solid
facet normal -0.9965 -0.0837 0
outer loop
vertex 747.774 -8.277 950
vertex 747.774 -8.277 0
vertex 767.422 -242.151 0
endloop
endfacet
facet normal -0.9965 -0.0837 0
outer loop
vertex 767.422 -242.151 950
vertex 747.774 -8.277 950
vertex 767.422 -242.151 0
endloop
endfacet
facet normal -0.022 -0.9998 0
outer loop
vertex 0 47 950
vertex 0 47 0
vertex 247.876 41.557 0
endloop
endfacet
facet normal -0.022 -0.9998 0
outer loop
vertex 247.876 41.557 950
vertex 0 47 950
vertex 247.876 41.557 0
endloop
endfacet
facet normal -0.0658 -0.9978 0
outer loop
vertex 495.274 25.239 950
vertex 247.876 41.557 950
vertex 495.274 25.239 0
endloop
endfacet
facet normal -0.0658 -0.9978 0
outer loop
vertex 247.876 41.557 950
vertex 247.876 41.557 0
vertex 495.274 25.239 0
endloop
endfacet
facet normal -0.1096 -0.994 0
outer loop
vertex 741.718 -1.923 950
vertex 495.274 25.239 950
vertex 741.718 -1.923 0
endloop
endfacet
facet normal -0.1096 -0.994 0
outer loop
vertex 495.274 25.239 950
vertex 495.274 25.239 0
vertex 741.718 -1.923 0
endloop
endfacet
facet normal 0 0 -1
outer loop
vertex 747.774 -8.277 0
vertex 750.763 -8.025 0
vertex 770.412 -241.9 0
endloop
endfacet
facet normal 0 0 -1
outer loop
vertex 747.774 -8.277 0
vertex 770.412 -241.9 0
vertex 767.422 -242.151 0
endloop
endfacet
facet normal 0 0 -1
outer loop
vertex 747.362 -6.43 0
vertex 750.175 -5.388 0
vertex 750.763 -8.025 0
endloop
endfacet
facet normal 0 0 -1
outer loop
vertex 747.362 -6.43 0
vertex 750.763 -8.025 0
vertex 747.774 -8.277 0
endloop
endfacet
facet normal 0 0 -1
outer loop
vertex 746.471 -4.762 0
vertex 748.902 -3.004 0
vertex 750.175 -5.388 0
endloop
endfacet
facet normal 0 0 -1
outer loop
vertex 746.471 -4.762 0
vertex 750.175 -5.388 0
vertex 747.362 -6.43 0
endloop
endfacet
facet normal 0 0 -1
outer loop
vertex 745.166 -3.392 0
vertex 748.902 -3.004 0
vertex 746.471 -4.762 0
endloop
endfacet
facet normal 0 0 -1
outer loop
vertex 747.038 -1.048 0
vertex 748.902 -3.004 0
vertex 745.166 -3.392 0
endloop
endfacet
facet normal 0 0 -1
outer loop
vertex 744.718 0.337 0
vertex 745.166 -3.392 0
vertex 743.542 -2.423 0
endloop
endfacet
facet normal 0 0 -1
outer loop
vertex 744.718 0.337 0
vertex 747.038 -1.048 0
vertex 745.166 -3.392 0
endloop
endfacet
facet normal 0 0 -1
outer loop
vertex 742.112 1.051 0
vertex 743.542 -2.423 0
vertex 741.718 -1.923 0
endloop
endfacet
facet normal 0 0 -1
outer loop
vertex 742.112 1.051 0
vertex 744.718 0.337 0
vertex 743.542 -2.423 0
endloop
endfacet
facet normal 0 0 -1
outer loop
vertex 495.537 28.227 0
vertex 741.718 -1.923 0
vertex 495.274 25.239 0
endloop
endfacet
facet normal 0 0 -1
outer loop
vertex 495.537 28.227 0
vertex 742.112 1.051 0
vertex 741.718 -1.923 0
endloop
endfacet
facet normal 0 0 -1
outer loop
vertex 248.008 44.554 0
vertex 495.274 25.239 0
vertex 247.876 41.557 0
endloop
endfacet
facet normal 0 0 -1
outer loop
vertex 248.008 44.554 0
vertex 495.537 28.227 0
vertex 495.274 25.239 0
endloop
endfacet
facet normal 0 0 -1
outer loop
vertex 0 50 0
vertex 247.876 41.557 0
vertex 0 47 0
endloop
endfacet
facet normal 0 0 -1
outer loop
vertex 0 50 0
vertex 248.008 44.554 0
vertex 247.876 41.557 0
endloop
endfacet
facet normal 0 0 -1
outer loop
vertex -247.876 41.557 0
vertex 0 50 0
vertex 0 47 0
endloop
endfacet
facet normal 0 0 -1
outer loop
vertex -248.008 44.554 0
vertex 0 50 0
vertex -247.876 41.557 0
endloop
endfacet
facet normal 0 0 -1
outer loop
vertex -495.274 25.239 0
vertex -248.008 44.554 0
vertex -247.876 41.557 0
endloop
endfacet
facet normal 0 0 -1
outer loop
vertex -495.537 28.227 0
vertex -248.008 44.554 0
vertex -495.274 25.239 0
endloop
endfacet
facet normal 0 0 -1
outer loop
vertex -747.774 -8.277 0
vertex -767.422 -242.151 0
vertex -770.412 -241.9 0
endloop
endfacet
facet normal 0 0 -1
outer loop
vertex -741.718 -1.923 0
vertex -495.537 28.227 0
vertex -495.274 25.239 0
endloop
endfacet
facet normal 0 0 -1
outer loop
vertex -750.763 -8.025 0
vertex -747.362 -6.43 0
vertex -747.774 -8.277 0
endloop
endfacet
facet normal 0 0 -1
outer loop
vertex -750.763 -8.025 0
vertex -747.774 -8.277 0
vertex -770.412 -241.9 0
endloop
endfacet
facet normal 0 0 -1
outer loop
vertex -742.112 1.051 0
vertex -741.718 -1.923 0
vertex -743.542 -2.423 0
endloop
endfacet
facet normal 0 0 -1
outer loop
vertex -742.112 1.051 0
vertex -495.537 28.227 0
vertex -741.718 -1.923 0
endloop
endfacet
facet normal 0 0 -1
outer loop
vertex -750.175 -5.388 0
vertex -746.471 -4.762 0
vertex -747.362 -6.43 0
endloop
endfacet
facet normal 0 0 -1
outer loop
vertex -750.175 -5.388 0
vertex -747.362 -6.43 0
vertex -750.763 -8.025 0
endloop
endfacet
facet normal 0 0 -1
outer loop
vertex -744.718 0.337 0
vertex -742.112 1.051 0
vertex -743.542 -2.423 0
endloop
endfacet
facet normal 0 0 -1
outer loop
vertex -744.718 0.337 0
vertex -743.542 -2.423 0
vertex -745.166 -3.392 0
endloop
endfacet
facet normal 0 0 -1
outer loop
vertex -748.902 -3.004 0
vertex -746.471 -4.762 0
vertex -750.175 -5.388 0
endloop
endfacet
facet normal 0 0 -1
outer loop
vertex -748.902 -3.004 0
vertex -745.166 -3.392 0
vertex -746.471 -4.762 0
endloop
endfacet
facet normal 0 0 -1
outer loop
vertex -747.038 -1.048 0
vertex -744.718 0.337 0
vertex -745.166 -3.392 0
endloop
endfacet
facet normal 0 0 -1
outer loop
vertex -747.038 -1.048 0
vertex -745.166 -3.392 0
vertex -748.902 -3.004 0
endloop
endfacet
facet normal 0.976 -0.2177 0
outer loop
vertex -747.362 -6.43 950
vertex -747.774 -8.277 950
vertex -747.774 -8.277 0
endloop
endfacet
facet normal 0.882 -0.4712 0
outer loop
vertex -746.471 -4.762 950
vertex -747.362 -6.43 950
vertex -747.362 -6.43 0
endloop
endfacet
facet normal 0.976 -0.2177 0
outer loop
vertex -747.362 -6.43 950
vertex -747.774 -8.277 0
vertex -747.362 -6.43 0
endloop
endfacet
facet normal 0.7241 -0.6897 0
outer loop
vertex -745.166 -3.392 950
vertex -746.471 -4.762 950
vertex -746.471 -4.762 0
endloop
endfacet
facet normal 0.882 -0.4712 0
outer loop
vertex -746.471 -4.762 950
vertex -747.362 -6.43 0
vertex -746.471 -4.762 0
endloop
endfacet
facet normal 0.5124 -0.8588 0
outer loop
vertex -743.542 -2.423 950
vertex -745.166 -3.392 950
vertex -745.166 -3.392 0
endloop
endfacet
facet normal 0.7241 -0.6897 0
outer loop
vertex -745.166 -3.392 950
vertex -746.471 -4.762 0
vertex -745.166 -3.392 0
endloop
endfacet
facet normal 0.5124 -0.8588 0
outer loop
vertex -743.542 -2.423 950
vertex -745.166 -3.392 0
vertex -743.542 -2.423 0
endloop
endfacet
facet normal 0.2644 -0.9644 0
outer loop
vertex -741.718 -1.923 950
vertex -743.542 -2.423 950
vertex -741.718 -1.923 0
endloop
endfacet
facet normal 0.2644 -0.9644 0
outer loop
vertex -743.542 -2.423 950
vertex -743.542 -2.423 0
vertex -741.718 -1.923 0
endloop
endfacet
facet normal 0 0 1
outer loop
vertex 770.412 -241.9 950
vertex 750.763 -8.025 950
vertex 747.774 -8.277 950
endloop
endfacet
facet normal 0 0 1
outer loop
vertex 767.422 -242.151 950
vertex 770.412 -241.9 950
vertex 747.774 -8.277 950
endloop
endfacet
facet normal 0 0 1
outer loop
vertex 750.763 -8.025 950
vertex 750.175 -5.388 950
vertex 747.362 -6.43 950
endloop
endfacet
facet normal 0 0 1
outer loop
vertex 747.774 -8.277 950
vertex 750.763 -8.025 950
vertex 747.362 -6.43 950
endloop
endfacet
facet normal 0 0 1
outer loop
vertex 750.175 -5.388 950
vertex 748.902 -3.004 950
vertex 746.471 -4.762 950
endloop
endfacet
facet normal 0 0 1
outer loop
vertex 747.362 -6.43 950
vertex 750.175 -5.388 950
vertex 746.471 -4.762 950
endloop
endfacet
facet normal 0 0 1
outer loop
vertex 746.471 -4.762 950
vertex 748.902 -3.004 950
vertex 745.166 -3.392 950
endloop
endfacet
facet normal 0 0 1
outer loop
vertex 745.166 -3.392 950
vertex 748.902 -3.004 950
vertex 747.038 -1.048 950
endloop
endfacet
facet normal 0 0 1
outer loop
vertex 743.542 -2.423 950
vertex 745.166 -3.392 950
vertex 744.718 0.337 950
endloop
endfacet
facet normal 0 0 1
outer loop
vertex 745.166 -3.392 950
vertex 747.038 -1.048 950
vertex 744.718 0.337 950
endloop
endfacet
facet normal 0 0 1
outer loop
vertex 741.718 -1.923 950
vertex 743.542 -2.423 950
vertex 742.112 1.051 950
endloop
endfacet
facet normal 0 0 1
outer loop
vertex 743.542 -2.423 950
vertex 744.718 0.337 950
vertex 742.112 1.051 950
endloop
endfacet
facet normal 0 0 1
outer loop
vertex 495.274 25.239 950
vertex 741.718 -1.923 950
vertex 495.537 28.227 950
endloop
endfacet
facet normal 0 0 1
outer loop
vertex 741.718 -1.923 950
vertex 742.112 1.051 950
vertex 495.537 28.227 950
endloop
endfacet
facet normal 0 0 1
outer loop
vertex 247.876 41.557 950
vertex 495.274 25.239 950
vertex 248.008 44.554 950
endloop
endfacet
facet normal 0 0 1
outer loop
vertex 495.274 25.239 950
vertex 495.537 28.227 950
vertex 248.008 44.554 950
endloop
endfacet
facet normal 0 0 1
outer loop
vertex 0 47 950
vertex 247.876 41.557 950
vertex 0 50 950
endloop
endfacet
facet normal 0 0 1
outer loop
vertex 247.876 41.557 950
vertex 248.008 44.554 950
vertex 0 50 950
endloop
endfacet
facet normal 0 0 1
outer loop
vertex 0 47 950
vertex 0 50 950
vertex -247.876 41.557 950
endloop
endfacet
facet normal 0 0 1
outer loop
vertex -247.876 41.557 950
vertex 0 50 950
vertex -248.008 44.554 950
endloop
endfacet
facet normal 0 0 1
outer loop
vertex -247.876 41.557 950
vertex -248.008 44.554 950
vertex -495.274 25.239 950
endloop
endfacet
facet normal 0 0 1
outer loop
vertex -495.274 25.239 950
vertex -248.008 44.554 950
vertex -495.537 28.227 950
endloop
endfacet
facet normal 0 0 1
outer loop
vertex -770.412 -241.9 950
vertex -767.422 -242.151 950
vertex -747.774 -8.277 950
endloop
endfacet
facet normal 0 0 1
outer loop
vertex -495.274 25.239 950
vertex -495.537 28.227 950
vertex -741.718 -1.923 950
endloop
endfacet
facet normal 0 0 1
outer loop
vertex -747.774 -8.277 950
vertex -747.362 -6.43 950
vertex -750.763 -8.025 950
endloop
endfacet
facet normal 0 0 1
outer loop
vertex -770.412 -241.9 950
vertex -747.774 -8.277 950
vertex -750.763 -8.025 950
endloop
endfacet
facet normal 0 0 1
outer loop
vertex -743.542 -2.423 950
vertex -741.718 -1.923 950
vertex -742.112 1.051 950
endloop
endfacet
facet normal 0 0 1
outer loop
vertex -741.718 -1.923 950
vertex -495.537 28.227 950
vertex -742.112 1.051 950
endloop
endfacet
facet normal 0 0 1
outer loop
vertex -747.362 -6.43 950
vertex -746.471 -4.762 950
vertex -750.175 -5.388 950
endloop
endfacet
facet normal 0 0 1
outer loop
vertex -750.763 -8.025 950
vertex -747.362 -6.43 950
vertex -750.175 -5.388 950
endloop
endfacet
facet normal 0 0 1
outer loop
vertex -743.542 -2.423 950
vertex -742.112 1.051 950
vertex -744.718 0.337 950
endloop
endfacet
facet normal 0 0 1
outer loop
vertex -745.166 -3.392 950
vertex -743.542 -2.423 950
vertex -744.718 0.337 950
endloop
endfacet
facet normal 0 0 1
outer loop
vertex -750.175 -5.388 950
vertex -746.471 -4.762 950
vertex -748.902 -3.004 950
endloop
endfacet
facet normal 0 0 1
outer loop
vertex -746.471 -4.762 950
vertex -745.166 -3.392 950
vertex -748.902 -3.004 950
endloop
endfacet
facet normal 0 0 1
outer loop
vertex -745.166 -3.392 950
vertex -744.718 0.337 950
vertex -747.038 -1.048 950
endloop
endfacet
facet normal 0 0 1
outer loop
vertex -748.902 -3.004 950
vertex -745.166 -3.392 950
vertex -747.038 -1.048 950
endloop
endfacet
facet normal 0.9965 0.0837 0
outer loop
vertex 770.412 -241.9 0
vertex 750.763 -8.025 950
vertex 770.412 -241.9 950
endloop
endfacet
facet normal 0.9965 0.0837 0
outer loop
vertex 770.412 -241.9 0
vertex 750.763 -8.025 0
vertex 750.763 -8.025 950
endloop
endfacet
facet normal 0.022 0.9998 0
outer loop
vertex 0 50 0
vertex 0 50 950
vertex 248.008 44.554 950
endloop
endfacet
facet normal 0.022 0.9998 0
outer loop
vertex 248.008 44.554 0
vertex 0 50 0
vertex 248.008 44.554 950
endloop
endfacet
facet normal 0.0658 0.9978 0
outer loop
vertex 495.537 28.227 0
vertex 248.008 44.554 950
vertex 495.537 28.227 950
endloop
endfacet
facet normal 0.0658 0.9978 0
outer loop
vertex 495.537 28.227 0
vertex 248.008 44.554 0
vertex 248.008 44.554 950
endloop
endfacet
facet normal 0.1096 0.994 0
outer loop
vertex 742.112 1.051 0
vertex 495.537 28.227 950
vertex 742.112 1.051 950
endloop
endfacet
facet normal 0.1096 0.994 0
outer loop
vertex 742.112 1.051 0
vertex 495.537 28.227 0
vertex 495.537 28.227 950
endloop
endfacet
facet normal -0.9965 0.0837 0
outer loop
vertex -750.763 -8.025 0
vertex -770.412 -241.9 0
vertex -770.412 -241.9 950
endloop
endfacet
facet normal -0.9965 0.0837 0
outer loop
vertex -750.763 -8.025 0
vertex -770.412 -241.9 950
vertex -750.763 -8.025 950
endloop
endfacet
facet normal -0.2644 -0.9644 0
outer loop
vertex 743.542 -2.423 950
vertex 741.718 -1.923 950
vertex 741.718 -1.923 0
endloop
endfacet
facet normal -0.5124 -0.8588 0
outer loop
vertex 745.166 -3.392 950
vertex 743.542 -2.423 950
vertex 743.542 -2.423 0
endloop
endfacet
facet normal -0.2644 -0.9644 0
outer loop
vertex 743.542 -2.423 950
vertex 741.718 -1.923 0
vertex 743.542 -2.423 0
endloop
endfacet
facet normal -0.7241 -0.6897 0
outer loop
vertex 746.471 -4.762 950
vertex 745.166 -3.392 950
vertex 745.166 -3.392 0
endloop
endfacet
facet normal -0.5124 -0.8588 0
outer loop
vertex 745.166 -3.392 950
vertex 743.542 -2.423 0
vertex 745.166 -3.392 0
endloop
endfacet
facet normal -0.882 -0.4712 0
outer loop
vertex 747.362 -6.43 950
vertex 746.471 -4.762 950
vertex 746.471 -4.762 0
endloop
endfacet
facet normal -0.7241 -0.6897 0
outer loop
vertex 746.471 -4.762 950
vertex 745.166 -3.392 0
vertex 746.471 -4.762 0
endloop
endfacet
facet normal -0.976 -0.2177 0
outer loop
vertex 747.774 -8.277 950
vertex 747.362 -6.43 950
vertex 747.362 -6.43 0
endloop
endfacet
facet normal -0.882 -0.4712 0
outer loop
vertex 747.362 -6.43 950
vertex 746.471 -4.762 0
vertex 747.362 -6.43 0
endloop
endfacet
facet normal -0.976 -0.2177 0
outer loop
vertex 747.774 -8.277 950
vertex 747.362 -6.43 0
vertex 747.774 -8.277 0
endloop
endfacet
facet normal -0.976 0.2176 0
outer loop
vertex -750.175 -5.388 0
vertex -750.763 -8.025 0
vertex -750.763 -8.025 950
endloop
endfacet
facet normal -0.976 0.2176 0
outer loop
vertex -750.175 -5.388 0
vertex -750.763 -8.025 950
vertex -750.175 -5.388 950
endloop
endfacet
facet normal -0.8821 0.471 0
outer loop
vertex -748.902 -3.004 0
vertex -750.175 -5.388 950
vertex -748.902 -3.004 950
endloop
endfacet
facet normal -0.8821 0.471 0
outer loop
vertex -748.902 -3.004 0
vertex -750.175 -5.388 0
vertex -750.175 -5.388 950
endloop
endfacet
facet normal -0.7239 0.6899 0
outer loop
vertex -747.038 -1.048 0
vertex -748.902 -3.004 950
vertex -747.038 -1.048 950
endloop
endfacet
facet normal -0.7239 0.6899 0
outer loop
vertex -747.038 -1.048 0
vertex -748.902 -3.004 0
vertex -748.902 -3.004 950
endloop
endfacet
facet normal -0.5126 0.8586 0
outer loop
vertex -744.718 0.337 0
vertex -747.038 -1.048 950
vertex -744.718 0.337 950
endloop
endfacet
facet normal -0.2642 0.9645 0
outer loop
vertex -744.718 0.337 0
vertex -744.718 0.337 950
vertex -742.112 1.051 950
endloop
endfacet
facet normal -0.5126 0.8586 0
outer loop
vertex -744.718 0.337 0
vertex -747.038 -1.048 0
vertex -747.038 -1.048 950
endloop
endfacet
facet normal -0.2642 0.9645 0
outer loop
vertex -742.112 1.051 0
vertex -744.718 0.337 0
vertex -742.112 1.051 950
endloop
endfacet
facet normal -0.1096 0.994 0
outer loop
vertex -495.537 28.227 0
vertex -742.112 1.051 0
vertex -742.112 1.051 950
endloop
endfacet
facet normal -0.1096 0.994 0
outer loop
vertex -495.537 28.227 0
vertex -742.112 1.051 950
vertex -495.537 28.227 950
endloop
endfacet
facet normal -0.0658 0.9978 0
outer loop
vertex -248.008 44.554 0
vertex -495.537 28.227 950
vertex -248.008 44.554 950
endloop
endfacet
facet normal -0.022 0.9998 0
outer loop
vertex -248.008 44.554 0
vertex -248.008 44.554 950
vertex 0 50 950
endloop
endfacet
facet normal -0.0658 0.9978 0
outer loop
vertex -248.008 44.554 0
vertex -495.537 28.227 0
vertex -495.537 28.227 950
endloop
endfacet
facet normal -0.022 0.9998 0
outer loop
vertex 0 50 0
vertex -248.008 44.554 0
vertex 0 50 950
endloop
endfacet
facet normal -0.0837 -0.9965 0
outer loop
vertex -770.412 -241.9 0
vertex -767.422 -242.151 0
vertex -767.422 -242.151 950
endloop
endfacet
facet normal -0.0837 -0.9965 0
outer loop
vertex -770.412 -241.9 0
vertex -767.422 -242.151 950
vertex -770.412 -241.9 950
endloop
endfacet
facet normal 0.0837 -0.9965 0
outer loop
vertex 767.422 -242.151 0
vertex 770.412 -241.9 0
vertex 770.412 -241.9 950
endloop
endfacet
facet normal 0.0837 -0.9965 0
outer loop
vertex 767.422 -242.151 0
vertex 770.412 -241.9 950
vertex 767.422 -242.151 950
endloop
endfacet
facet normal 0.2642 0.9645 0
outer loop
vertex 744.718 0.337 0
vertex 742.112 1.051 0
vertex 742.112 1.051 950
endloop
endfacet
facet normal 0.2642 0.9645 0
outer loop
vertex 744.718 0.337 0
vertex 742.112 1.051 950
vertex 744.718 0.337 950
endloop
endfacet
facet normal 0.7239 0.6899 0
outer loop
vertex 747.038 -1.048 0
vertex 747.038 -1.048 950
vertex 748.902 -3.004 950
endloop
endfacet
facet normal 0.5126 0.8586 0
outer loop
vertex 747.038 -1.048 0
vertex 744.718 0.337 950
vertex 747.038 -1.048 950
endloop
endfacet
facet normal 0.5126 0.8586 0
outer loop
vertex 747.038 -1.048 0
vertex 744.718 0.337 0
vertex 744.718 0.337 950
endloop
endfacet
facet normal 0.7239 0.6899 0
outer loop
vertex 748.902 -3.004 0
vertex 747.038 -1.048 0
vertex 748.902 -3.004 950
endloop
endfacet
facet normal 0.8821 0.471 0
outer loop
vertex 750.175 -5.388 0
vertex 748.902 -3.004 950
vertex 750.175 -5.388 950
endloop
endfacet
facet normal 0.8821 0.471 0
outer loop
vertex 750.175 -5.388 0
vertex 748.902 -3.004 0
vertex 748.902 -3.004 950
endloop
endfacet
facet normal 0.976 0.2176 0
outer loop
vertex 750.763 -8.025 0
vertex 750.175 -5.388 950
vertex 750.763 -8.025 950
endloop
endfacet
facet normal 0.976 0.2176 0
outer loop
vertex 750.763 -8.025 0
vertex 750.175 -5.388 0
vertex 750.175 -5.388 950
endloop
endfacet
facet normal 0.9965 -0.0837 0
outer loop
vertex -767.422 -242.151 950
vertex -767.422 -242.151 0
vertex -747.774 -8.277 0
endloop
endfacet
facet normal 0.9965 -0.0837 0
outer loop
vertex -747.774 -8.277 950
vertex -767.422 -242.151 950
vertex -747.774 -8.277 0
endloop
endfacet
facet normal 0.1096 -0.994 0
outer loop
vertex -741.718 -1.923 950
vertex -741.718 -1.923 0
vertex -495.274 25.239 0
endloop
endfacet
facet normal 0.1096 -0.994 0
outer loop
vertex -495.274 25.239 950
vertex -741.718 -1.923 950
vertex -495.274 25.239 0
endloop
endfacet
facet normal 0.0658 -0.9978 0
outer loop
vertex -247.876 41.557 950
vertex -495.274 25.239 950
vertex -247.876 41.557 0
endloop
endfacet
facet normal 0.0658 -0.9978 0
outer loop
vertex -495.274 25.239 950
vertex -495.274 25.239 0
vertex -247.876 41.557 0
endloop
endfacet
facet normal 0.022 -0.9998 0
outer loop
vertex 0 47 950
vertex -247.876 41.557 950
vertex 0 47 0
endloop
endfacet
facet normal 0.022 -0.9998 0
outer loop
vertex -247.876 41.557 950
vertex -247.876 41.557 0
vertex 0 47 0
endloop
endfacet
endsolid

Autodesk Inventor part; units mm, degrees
ref_plane "YZ Plane" through (0, 0, 0) normal (1, 0, 0) x (0, 1, 0)
ref_plane "XZ Plane" through (0, 0, 0) normal (0, 1, 0) x (-1, 0, 0)
ref_plane "XY Plane" through (0, 0, 0) normal (0, 0, 1) x (1, 0, 0)
sketch "Sketch1" plane through (0, 0, 0) normal (0, 0, 1) x (1, 0, 0)
  line L0 (-750, 0) -> (750, 0) construction
  line L1 (750, 0) -> (750, -2700) construction
  line L2 (750, -2700) -> (-750, -2700) construction
  line L3 (-750, -2700) -> (-750, 0) construction
  line L4 (800, 50) -> (-800, 50) construction
  line L5 (-800, 50) -> (-800, -2750) construction
  line L6 (-800, -2750) -> (800, -2750) construction
  line L7 (800, -2750) -> (800, 50) construction
  line L8 (-850, 100) -> (850, 100) construction
  line L9 (850, 100) -> (850, -2800) construction
  line L10 (850, -2800) -> (-850, -2800) construction
  line L11 (-850, -2800) -> (-850, 100) construction
  arc A0 (750, 0) -> (742.111681, 1.050817) centre (0, -5600) ccw construction
  line L12 (-750, -2100) -> (750, -2100) construction
  line L13 (115.485997, -2697.8227) -> (750, -2100) construction
  arc A1 (750, -2100) -> (750, 0) centre (-10250, -1050) ccw construction
  arc A2 (110, -2700) -> (115.485997, -2697.8227) centre (110, -2692) ccw construction
  arc A3 (742.111681, 1.050817) -> (0, 50) centre (0, -5600) ccw
  line L14 (0, 100) -> (0, 50) construction
  line L15 (0, -2700) -> (0, -2697) construction
  line L16 (0, 47) -> (0, 0) construction
  line L17 (0, 50) -> (0, 47) construction
  line L18 (750.763103, -8.025362) -> (770.411716, -241.9)
  arc A4 (750.763103, -8.025362) -> (742.111681, 1.050817) centre (740.798209, -8.862547) ccw
  point P0 (0, -2750)
  dimension "d54" = 1500
  dimension "d55" = 2700
  dimension "d58" = 2100
  dimension "d83" = 8
  dimension "d113" = 50
  dimension "d114" = 50
  dimension "d115" = 3
  dimension "d121" = 10
  dimension "d122" = 241.9
  dimension "d124" = 94.8023
contour flange "Contour Flange2" sketch "Sketch1" thickness 3 bend radius 5 width 950 along (0, 0, 1) mid plane no both sides no wall seen from (760.58741, -124.962681, 0) lies toward (-0.9964894, -0.0837185, 0) curves L18 A4 A3
bend "Bend2"
corner "Corner2"
mirror "Mirror2" about plane through (0, 0, 0) normal (1, 0, 0)
sketch "Sketch2" plane through (747.773635, -8.276518, 0) normal (-0.9964894, -0.0837185, 0) x (0, 0, 1)
  line L0 (931.668513, -217.277497) -> (809.542302, -217.277497) construction
  line L1 (809.542302, -217.277497) -> (809.542302, -193.633612) construction
  line L2 (809.542302, -193.633612) -> (931.668513, -193.633612) construction
  line L3 (931.668513, -193.633612) -> (931.668513, -217.277497) construction
  point P0 (0, 70.849954)
mark "Mark1"
equation "\"d36\" = Thickness"
equation "\"d37\" = BendReliefWidth"
equation "\"d38\" = BendReliefDepth"
equation "\"d39\" = MinimumRemnant"
equation "\"d40\" = TransitionRadius"
equation "\"d42\" = BendRadius"
equation "\"d44\" = CornerReliefSize"
equation "\"d45\" = GapSize"
equation "\"d46\" = JacobiRadiusSize"
equation "\"BendReliefWidth\" = Thickness"
equation "\"BendReliefDepth\" = 0.5 * Thickness"
equation "\"CornerReliefSize\" = 4 * Thickness"
equation "\"MinimumRemnant\" = 2 * Thickness"
equation "\"GapSize\" = Thickness"
equation "\"Thickness\" = 3"
equation "\"TransitionRadius\" = 5"
equation "\"BendRadius\" = 5"
equation "\"JacobiRadiusSize\" = 5"
properties part number "MSC 208 SHEET BACK START" material "Stainless Steel AISI 304"
